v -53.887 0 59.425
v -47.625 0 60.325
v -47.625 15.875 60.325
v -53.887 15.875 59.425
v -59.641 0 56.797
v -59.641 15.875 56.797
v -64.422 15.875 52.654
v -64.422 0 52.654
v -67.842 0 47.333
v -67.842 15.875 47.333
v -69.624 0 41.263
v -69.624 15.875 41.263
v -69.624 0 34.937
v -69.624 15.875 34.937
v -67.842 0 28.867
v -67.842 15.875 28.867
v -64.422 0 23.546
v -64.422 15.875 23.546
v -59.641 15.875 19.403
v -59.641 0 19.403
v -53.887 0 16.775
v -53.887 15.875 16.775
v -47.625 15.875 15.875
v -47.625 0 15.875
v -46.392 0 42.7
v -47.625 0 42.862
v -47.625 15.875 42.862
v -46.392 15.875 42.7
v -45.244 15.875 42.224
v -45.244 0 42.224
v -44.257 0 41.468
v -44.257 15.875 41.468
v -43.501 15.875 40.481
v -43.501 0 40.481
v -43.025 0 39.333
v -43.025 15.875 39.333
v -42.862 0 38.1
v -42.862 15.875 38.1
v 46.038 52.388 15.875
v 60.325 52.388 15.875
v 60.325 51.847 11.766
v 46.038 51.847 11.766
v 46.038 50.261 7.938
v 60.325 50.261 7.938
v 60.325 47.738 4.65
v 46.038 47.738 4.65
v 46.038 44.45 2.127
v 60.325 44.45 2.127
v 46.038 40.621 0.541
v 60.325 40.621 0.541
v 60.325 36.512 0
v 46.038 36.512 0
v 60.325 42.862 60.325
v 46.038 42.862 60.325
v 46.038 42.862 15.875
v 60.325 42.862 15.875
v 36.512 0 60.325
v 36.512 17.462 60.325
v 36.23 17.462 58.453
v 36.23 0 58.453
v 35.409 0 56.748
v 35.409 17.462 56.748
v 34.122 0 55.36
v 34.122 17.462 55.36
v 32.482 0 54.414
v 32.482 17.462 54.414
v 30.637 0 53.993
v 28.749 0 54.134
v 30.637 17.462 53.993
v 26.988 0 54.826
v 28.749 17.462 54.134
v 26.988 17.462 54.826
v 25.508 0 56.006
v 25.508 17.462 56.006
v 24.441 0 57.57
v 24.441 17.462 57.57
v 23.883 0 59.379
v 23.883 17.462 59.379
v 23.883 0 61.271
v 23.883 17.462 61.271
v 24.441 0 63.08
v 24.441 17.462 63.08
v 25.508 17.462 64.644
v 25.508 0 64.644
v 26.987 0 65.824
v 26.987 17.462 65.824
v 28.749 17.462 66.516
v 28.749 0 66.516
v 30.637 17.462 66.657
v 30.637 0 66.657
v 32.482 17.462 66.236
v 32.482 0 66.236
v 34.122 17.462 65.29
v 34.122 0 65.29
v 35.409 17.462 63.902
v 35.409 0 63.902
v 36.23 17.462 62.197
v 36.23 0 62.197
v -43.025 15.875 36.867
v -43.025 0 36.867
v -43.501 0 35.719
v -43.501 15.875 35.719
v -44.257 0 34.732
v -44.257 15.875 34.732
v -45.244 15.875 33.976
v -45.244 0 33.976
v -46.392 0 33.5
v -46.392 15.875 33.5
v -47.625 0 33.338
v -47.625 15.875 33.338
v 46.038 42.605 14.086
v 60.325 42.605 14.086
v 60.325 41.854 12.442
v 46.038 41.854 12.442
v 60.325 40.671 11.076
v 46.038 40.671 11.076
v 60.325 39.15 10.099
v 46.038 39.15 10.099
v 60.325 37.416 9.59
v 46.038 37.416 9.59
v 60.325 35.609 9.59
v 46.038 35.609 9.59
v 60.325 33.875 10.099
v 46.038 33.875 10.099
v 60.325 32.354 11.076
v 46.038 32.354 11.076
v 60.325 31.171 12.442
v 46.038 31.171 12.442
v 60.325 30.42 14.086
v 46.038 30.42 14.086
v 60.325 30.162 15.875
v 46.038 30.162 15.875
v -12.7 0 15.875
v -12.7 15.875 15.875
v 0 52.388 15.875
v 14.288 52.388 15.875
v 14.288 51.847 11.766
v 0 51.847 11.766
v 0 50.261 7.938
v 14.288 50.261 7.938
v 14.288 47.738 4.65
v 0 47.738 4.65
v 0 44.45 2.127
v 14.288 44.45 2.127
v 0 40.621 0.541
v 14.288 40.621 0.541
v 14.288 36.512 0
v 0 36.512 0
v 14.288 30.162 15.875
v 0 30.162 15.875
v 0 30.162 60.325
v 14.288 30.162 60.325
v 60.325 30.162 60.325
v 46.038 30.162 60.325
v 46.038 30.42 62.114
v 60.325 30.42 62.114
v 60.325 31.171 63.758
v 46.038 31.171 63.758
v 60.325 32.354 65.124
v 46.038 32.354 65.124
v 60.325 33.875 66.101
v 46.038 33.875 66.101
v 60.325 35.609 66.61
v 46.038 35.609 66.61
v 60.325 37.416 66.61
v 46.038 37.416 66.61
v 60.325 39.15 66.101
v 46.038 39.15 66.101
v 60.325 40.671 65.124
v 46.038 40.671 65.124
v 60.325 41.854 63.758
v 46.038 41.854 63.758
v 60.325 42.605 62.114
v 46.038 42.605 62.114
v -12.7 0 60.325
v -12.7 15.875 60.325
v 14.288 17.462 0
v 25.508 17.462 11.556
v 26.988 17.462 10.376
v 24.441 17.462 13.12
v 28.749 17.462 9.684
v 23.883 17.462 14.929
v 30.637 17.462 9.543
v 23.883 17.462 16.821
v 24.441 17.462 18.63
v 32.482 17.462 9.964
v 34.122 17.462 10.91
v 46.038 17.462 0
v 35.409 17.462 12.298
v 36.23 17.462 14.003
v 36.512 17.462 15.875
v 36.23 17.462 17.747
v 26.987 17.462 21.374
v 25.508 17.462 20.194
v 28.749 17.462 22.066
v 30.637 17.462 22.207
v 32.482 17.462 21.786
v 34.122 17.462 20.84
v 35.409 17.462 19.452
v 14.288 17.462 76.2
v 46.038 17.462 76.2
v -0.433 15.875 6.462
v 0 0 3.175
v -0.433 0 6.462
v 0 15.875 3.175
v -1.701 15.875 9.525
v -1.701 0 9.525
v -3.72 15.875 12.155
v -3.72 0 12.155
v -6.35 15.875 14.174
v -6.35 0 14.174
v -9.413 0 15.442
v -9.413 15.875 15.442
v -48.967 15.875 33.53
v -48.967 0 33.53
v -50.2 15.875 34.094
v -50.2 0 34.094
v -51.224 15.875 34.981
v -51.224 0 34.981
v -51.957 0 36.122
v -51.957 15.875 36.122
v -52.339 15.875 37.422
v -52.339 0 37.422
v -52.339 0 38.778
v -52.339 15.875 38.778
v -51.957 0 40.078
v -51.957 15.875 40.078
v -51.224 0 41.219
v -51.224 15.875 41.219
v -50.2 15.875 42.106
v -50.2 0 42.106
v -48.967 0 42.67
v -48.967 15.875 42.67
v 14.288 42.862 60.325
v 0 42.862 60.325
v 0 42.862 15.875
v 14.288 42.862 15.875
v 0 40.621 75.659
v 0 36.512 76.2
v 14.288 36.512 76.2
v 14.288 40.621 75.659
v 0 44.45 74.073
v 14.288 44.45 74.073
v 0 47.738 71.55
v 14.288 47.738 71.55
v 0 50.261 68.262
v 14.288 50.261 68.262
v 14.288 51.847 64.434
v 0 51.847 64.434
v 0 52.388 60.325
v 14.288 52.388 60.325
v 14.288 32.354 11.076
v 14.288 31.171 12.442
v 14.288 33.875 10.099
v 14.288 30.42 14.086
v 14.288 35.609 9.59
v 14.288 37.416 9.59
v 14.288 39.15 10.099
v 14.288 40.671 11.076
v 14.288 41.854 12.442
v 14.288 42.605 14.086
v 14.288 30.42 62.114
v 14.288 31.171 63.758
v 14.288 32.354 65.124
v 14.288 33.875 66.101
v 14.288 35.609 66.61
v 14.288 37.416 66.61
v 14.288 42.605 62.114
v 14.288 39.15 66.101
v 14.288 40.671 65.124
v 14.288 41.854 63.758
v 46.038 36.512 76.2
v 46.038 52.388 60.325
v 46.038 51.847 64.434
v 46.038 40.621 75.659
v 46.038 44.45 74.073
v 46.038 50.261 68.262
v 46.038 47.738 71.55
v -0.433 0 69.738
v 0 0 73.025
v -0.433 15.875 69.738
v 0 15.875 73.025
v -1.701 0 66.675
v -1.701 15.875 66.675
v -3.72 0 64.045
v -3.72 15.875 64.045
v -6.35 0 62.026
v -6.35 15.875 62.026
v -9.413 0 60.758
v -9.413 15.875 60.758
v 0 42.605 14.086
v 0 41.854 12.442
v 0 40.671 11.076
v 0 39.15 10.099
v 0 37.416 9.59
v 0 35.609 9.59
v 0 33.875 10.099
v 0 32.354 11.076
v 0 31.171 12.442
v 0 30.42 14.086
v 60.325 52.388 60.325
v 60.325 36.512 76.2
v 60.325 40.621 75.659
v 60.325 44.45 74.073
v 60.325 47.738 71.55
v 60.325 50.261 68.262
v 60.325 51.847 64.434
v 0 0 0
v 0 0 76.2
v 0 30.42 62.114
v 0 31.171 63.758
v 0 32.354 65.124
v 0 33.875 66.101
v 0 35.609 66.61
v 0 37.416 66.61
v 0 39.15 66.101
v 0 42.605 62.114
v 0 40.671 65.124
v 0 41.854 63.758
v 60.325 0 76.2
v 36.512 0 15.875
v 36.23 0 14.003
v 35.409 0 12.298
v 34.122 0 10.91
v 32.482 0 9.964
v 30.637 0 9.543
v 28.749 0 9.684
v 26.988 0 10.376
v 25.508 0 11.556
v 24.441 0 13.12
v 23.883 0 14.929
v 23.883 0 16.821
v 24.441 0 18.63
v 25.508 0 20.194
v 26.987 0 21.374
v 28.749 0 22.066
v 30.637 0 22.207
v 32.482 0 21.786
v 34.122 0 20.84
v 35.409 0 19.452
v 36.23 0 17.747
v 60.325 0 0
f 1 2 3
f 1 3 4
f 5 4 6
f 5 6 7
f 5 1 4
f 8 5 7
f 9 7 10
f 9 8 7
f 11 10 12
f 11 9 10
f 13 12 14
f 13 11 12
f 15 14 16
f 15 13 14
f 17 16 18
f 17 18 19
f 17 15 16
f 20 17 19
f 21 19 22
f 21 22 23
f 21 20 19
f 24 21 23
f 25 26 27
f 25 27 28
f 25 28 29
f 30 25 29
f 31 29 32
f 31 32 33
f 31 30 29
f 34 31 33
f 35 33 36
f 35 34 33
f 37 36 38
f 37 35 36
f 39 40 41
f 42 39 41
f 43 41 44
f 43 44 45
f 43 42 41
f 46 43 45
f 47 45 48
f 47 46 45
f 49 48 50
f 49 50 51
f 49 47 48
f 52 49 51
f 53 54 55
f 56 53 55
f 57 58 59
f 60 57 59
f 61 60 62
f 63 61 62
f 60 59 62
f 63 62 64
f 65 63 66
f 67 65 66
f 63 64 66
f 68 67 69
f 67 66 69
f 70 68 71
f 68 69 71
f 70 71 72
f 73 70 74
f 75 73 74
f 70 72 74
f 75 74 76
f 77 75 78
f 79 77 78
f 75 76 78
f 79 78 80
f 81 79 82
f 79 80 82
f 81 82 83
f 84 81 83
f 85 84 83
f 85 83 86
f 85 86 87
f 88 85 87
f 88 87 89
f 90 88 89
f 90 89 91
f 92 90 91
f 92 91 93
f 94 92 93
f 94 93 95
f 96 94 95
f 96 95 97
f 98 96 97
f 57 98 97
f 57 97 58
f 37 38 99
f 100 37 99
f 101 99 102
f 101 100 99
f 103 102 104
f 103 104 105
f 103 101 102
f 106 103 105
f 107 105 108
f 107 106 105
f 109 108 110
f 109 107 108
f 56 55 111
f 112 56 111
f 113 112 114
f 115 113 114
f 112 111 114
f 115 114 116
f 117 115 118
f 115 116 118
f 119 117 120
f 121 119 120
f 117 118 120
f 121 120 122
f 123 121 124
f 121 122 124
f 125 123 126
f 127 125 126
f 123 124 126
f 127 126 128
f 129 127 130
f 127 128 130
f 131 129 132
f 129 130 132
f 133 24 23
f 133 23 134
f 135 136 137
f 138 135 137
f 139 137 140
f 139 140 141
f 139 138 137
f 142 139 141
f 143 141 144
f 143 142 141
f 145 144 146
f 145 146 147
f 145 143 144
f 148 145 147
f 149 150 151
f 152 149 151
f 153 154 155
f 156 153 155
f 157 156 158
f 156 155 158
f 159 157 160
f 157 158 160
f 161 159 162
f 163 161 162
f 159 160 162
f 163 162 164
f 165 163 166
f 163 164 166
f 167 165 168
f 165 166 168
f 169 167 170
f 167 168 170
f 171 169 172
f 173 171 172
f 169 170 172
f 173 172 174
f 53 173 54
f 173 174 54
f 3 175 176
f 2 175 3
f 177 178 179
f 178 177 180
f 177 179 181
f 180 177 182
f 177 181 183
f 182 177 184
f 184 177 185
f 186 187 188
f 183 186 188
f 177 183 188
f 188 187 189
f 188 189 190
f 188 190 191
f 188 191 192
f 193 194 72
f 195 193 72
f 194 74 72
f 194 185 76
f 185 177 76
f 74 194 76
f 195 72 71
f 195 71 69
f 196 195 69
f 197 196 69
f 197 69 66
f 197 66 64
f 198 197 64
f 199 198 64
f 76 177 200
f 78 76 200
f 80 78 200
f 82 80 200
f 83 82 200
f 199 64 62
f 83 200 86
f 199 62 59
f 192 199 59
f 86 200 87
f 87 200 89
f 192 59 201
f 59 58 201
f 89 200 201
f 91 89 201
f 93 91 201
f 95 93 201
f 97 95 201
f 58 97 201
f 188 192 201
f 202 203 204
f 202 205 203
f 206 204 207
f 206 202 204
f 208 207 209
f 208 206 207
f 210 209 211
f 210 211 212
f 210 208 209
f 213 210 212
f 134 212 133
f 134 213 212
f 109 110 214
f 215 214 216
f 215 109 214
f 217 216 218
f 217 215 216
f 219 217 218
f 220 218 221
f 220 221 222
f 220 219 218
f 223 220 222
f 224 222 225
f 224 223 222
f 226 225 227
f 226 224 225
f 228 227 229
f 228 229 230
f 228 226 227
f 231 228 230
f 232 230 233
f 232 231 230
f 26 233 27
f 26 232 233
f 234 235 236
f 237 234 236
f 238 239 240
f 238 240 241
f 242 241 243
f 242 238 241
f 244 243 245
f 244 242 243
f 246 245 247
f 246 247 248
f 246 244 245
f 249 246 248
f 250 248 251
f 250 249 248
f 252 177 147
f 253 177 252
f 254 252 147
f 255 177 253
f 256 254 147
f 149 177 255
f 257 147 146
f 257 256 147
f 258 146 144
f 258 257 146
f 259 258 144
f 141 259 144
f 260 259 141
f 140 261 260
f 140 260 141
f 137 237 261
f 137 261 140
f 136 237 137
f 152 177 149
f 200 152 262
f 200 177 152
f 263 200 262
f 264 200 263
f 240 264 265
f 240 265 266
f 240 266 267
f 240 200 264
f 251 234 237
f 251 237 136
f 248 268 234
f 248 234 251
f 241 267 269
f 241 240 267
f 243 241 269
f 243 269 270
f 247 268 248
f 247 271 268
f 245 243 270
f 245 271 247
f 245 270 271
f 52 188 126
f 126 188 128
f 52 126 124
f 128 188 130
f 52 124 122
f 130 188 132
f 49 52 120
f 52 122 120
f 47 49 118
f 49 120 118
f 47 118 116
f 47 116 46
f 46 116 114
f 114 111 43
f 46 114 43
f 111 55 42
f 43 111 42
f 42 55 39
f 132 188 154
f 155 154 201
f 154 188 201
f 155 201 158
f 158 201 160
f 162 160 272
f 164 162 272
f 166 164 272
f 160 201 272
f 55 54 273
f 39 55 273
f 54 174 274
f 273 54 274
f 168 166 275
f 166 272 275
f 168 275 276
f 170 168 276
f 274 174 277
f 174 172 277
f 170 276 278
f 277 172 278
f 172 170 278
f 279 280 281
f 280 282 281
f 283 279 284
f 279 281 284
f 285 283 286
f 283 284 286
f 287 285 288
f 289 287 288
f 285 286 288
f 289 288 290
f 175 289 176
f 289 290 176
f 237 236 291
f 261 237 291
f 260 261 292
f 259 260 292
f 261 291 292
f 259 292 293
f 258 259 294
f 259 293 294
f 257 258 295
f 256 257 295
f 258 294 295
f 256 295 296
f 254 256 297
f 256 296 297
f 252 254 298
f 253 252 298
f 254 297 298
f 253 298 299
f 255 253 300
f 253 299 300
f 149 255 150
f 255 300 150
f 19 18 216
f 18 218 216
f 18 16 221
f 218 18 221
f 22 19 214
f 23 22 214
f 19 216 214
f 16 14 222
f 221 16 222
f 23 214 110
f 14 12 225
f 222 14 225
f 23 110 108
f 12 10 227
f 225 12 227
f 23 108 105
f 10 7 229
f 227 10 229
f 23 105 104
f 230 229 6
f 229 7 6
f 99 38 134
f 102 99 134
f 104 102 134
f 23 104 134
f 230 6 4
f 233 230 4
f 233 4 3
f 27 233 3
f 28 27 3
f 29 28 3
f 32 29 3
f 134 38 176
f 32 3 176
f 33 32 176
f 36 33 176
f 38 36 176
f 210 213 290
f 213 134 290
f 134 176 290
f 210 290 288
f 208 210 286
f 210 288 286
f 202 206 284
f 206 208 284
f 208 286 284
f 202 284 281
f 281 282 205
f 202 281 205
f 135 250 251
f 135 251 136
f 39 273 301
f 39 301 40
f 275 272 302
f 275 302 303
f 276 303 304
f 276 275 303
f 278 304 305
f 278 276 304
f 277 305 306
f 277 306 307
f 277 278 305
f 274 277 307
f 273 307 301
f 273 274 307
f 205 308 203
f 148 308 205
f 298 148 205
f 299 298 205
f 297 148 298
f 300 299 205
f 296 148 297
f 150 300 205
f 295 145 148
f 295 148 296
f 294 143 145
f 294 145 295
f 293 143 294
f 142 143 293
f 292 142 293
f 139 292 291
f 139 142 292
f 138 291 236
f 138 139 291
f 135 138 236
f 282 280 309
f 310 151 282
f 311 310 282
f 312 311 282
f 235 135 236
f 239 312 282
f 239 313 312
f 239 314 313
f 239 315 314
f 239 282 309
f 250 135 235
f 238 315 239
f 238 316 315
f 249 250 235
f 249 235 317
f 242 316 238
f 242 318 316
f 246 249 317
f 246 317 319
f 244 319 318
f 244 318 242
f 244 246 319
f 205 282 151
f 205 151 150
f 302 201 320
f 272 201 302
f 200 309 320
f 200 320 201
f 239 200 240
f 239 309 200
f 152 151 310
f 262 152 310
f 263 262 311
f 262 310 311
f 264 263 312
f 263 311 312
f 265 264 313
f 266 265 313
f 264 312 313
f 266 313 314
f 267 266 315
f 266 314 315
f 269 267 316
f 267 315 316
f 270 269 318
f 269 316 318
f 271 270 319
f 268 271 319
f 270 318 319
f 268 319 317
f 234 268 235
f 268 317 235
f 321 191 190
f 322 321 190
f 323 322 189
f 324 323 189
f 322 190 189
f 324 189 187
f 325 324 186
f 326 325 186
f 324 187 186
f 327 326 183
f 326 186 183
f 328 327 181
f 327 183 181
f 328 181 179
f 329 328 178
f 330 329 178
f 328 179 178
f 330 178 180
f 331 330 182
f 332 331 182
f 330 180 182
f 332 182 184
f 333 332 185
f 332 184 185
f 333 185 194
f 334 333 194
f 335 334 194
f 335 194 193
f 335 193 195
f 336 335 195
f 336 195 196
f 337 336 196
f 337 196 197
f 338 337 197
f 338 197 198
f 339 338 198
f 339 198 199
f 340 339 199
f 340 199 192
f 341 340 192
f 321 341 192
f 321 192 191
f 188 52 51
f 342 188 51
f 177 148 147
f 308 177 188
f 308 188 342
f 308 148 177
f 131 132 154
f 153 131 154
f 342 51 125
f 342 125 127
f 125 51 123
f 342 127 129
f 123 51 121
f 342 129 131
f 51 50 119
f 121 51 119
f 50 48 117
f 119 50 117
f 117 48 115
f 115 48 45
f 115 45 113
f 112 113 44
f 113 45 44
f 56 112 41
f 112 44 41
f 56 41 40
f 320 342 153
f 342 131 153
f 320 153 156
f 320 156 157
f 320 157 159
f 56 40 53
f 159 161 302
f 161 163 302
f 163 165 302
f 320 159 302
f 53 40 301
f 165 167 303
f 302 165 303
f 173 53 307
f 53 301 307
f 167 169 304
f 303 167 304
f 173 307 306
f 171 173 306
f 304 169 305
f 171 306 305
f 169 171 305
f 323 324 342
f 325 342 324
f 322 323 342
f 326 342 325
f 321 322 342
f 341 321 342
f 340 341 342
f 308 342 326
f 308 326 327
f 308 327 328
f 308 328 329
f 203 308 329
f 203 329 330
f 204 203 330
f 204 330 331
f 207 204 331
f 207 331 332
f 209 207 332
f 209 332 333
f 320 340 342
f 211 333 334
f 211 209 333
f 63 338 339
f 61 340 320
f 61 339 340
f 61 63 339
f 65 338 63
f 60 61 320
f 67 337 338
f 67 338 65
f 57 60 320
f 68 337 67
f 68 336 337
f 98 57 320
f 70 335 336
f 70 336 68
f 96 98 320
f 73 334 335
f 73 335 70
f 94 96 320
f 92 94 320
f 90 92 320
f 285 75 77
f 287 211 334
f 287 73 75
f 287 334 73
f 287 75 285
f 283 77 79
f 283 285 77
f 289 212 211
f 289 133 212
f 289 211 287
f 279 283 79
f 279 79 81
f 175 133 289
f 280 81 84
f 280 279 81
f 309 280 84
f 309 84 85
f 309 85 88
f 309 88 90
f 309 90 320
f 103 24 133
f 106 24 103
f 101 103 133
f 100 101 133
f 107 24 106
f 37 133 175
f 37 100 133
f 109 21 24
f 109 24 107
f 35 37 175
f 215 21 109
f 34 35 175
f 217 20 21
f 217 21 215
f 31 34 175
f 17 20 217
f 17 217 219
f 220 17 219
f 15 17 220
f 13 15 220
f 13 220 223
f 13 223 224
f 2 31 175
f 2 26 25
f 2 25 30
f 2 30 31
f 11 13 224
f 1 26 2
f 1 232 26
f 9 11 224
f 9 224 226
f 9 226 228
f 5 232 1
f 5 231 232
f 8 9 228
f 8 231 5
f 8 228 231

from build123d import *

# Parameters (mm, degrees)
BOSS_EXTRUDE1_DEPTH = 60.325
SKETCH5_W           = 31.75
SKETCH5_H           = 34.925
CUT_EXTRUDE1_DEPTH  = 77.2
BOSS_EXTRUDE2_DEPTH = 15.875
FILLET1_R           = 12.7
SKETCH7_R           = 6.35
CUT_EXTRUDE2_DEPTH  = 18.4625


with BuildPart() as part:
    # Sketch1 → Boss-Extrude1 (new body)
    with BuildSketch(Plane(origin=(0, 0, 0), x_dir=(0, 0, -1), z_dir=(1, 0, 0))):
        with BuildLine():
            Line((-60.325, 52.3875), (-15.875, 52.3875))
            ThreePointArc((-15.875, 52.3875), (-4.649679849, 47.737820151), (0, 36.5125))
            Line((0, 36.5125), (0, 0))
            Line((0, 0), (-76.2, 0))
            Line((-76.2, 0), (-76.2, 36.5125))
            ThreePointArc((-76.2, 36.5125), (-71.550320151, 47.737820151), (-60.325, 52.3875))
        make_face()
        with BuildLine():
            Line((-60.325, 42.8625), (-15.875, 42.8625))
            ThreePointArc((-15.875, 42.8625), (-9.525, 36.5125), (-15.875, 30.1625))
            Line((-15.875, 30.1625), (-60.325, 30.1625))
            ThreePointArc((-60.325, 30.1625), (-66.675, 36.5125), (-60.325, 42.8625))
        make_face(mode=Mode.SUBTRACT)
    extrude(amount=BOSS_EXTRUDE1_DEPTH)

    # Sketch5 → Cut-Extrude1 (cut, through all)
    with BuildSketch(Plane.XY.offset(76.2)):
        with Locations((30.1625, 34.925)):
            Rectangle(SKETCH5_W, SKETCH5_H)
    extrude(amount=-CUT_EXTRUDE1_DEPTH, mode=Mode.SUBTRACT)

    # Sketch6 → Boss-Extrude2 (add)
    with BuildSketch(Plane.XZ):
        with BuildLine():
            Line((0, 15.875), (0, 60.325))
            Line((0, 60.325), (-47.625, 60.325))
            ThreePointArc((-47.625, 60.325), (-31.909551788, 53.815448212), (-25.4, 38.1))
            ThreePointArc((-25.4, 38.1), (-31.909551788, 22.384551788), (-47.625, 15.875))
            Line((-47.625, 15.875), (0, 15.875))
        make_face()
        with BuildLine():
            ThreePointArc((-25.4, 38.1), (-31.909551788, 53.815448212), (-47.625, 60.325))
            Line((-47.625, 60.325), (-47.625, 42.8625))
            ThreePointArc((-47.625, 42.8625), (-44.257403955, 41.467596045), (-42.8625, 38.1))
            ThreePointArc((-42.8625, 38.1), (-44.257403955, 34.732403955), (-47.625, 33.3375))
            Line((-47.625, 33.3375), (-47.625, 15.875))
            ThreePointArc((-47.625, 15.875), (-31.909551788, 22.384551788), (-25.4, 38.1))
        make_face()
        with BuildLine():
            Line((-47.625, 42.8625), (-47.625, 60.325))
            ThreePointArc((-47.625, 60.325), (-69.85, 38.1), (-47.625, 15.875))
            Line((-47.625, 15.875), (-47.625, 33.3375))
            ThreePointArc((-47.625, 33.3375), (-52.3875, 38.1), (-47.625, 42.8625))
        make_face()
    extrude(amount=-BOSS_EXTRUDE2_DEPTH)

    # Fillet1
    fillet1_edges = [part.edges().sort_by_distance(p)[0] for p in [
        (0, 7.9375, 15.875),
        (0, 7.9375, 60.325),
    ]]
    fillet(fillet1_edges, radius=FILLET1_R)

    # Sketch7 → Cut-Extrude2 (cut, through all)
    with BuildSketch(Plane(origin=(0, 17.4625, 0), x_dir=(1, 0, 0), z_dir=(0, 1, 0))):
        with Locations((30.1625, -15.875)):
            Circle(SKETCH7_R)
        with Locations((30.1625, -60.325)):
            Circle(SKETCH7_R)
    extrude(amount=-CUT_EXTRUDE2_DEPTH, mode=Mode.SUBTRACT)


solid = part.part
